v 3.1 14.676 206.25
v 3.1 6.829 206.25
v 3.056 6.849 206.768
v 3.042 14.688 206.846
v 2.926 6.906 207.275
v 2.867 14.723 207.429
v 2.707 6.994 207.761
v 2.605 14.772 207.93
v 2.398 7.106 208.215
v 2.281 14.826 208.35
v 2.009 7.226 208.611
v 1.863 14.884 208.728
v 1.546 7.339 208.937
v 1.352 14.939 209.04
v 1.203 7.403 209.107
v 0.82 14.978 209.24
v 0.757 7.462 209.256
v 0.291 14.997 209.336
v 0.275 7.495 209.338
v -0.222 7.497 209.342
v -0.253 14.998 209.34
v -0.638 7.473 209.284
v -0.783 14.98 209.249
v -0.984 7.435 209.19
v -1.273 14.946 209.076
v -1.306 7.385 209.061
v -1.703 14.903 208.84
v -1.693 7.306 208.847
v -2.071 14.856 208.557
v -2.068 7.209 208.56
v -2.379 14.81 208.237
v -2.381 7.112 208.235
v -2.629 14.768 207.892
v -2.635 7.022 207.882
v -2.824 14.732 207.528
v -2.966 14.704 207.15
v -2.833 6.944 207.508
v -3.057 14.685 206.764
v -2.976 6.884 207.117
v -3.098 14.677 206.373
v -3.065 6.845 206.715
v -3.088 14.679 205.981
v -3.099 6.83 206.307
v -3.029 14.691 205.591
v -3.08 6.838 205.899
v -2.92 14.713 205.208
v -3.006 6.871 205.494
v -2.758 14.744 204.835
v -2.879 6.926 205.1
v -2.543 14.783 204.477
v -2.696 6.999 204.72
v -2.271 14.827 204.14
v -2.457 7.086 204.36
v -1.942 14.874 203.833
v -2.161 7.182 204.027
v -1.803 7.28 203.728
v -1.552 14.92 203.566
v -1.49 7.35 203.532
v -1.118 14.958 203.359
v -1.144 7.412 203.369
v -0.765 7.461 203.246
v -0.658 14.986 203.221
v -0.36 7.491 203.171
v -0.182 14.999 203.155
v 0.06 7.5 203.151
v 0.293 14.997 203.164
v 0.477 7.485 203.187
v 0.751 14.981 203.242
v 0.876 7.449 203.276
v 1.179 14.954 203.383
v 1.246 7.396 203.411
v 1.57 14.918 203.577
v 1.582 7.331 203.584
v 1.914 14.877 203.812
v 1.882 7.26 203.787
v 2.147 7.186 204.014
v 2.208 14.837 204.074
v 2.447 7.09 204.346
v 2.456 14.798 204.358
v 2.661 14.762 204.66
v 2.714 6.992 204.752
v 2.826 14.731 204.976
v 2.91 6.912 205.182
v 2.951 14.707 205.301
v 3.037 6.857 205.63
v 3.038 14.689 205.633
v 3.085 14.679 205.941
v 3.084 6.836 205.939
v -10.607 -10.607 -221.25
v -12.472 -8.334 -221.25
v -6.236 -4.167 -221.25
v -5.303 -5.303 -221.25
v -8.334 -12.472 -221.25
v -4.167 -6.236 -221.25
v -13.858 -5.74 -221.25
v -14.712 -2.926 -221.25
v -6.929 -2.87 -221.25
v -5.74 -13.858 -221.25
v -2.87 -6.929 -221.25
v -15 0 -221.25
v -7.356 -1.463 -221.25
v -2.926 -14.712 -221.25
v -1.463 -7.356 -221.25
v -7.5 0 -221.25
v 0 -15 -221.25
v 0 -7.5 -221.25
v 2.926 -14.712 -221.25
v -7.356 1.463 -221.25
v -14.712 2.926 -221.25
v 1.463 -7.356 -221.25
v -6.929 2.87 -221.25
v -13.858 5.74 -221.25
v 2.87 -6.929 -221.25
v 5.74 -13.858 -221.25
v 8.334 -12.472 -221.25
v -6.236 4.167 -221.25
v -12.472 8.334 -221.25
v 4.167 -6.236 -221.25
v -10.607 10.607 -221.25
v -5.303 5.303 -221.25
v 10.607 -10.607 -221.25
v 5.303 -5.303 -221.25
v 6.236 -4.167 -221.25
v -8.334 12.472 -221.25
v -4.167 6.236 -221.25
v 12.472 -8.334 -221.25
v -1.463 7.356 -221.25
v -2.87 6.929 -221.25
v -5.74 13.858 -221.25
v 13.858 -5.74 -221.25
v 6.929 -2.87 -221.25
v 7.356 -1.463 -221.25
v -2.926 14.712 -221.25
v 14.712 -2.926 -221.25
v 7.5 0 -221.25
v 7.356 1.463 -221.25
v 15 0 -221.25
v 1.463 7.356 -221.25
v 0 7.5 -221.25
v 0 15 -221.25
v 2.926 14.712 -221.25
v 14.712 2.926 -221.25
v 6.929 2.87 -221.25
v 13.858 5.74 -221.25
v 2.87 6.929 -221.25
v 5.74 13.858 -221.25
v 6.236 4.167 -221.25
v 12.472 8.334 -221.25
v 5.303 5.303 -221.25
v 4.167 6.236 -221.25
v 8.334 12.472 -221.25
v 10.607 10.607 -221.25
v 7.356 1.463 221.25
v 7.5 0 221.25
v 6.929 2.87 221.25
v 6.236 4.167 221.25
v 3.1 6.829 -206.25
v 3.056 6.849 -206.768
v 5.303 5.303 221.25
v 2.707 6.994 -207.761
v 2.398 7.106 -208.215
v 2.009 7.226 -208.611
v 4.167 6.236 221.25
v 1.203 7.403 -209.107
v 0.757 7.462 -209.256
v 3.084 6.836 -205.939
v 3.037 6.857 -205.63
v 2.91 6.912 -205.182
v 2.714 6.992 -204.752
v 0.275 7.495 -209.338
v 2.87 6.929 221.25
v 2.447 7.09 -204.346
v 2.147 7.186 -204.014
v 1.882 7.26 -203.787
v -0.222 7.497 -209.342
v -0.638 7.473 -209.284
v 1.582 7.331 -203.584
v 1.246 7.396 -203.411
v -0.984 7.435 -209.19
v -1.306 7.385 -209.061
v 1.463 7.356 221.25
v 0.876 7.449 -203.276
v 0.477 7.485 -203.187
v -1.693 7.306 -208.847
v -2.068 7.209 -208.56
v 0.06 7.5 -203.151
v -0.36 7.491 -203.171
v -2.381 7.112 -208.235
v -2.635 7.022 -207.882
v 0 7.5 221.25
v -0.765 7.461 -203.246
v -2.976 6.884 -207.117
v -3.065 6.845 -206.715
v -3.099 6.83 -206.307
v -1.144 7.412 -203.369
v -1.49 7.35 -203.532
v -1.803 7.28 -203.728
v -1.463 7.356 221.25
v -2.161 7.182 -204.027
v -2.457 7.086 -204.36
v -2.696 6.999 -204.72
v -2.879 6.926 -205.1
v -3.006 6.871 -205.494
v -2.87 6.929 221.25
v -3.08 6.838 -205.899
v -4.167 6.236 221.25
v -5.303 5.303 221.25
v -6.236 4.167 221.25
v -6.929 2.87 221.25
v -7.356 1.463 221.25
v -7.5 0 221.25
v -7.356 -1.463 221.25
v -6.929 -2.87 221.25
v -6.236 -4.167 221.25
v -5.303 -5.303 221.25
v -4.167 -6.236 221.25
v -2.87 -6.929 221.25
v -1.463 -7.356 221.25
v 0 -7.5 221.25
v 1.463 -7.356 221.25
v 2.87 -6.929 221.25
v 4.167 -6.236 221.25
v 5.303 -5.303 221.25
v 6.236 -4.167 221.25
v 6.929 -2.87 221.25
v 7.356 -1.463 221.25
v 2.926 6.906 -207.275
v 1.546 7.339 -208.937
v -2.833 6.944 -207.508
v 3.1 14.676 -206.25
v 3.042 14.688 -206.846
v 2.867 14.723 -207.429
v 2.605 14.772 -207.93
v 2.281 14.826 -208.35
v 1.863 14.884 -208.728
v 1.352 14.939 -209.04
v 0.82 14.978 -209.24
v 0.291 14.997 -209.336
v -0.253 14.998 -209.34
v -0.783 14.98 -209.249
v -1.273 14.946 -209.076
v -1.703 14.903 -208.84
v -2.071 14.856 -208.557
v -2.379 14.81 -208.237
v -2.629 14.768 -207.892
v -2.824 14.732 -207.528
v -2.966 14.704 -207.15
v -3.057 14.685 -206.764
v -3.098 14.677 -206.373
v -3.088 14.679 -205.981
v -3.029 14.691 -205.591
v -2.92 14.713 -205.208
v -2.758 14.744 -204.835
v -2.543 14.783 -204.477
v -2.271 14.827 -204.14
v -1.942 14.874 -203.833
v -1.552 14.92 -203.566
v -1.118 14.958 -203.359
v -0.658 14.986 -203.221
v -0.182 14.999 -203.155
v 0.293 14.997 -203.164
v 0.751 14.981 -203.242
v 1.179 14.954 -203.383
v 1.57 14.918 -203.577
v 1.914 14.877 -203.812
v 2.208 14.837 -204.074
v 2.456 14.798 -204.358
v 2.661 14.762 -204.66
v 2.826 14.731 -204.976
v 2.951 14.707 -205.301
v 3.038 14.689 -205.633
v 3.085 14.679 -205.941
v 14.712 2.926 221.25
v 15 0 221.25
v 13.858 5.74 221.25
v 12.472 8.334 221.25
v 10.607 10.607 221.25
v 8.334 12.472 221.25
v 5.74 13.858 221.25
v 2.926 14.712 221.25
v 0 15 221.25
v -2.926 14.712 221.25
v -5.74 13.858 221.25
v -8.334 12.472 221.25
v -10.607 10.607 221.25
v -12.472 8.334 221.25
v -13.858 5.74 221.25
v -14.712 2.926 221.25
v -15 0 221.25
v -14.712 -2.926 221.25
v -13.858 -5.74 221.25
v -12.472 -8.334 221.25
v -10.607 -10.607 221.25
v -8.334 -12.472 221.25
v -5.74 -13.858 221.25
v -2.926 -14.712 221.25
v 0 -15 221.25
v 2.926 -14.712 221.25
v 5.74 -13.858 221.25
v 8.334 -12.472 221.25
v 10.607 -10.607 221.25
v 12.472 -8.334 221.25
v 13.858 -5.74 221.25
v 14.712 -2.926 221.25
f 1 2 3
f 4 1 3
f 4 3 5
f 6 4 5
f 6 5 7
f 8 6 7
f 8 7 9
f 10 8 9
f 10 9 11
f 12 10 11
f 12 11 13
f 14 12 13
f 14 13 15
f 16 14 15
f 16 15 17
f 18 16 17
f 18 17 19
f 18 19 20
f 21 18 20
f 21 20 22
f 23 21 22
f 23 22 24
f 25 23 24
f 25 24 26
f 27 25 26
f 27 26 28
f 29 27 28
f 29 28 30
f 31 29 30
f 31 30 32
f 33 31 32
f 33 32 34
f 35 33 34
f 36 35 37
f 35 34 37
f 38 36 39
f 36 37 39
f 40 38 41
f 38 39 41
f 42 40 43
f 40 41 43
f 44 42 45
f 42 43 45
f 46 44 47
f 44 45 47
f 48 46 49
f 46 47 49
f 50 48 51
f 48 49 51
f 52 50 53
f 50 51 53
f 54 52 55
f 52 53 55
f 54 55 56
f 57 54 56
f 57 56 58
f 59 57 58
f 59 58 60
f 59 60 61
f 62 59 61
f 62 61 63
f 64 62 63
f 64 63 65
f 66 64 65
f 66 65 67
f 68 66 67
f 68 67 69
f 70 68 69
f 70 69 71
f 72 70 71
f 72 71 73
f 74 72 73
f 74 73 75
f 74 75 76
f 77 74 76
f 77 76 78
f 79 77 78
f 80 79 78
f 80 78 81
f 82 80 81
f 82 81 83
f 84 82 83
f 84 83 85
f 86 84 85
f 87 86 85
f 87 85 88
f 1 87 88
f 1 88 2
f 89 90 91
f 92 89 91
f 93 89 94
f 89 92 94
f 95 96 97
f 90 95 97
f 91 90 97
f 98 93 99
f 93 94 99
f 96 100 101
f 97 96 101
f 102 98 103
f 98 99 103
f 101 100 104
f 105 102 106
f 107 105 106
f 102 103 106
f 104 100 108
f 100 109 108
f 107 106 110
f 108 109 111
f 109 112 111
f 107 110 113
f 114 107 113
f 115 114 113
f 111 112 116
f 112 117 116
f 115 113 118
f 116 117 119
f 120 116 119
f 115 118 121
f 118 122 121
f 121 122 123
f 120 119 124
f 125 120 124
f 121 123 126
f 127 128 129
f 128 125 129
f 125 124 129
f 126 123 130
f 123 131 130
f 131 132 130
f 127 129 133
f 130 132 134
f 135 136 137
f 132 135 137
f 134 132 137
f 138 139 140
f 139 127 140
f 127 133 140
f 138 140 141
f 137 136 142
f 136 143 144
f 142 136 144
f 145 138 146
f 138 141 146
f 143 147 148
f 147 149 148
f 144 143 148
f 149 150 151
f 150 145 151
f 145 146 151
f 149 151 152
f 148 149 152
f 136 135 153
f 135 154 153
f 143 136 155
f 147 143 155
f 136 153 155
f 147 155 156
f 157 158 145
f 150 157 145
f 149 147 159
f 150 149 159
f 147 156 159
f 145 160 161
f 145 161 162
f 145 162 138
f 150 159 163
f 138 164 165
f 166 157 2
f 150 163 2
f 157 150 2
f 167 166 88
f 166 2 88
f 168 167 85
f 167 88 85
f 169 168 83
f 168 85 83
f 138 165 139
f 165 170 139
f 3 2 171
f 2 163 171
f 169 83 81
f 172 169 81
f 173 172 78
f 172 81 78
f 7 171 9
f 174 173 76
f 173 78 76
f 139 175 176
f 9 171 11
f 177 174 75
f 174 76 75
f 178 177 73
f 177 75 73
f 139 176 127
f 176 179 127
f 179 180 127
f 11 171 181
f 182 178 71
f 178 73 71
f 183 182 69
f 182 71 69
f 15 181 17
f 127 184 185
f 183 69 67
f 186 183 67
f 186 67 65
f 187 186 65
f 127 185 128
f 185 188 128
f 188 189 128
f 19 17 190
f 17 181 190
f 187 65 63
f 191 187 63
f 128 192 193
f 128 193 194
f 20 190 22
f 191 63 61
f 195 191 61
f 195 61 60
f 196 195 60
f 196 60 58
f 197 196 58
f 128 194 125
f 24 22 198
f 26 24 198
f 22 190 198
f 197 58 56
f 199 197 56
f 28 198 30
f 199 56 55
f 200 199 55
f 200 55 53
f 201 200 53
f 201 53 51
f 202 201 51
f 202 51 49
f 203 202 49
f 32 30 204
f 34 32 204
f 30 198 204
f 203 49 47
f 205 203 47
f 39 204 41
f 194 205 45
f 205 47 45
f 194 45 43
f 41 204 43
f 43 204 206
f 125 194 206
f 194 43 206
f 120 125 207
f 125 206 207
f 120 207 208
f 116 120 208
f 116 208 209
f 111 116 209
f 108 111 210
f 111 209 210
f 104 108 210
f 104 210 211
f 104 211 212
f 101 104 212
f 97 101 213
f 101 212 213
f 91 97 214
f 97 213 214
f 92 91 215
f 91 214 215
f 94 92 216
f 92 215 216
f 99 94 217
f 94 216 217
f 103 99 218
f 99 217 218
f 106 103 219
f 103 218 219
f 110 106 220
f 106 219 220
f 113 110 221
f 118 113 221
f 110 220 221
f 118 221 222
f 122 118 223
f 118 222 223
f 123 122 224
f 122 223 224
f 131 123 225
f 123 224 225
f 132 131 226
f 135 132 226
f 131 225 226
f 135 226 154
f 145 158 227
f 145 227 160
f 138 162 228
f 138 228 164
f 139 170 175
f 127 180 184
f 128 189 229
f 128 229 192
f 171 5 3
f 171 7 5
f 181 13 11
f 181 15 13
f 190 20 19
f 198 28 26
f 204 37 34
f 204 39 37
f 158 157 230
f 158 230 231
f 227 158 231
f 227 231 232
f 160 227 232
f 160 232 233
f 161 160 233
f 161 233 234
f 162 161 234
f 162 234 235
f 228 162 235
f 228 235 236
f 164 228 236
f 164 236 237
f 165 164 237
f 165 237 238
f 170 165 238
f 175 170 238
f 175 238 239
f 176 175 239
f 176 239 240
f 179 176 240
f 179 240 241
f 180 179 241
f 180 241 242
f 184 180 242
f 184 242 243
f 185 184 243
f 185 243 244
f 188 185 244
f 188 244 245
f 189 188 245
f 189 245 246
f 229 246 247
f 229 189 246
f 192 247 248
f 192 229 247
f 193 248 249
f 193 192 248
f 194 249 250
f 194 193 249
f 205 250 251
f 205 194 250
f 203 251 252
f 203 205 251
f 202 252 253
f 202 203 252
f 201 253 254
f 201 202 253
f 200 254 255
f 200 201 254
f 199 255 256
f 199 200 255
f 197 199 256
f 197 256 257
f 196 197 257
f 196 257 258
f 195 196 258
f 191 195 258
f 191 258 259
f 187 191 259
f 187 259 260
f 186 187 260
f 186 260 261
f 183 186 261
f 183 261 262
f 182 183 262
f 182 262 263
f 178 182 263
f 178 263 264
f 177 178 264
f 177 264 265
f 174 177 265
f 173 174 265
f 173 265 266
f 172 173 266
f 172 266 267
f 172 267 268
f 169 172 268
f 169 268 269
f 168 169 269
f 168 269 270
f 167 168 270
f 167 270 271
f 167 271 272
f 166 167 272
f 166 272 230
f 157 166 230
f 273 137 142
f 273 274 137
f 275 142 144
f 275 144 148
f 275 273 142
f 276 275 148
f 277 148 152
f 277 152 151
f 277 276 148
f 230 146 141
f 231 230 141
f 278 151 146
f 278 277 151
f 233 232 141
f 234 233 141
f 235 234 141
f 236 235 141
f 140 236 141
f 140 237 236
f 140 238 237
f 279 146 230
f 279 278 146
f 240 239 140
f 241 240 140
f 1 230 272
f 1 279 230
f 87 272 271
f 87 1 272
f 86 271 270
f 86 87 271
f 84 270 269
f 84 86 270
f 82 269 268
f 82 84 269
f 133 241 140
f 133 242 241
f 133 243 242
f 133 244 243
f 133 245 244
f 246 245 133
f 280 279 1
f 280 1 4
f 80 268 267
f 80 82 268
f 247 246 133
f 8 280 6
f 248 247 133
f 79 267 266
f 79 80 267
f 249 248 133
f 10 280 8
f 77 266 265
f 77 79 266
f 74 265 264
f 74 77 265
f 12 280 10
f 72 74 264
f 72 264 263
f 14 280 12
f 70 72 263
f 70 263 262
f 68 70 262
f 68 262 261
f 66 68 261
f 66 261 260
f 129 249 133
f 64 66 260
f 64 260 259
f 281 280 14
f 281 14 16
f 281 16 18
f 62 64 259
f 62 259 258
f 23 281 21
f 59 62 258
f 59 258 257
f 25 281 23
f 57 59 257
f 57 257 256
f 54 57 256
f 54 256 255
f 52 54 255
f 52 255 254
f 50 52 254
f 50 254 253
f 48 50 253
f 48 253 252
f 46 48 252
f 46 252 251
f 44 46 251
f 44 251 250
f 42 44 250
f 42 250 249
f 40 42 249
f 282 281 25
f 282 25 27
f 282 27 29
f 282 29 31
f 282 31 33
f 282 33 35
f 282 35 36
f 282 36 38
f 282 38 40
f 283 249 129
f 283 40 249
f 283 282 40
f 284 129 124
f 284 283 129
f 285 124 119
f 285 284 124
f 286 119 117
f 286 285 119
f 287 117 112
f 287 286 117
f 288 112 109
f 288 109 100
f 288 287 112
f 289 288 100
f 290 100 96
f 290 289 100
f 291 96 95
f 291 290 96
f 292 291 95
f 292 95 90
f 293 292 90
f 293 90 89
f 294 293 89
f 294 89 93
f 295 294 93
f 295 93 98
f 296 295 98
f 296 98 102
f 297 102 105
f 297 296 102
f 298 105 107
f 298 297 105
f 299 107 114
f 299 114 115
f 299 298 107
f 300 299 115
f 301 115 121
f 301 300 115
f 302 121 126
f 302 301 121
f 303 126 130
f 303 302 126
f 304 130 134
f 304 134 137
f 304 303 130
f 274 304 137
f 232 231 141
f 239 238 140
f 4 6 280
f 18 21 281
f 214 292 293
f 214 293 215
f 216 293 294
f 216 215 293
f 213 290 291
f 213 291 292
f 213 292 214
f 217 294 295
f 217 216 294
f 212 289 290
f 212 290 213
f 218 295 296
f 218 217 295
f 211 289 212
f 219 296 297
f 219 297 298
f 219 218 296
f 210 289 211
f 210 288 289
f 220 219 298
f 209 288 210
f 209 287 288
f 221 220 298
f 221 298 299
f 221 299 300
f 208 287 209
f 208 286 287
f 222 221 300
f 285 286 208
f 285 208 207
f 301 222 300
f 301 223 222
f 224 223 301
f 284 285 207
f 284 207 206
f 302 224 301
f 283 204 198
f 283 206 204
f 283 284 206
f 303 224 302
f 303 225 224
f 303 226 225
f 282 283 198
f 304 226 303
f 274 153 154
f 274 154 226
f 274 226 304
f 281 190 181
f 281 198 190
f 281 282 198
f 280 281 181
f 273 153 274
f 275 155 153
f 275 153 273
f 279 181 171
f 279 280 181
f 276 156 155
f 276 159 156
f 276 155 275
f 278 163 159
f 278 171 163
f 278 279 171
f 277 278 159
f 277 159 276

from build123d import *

# Parameters (mm, degrees)
BOSS_EXTRUDE1_DEPTH      = 221.25
BOSS_EXTRUDE1_DEPTH_BACK = 221.25
SKETCH1_R                = 15
SKETCH1_R_2              = 7.5
SKETCH3_R                = 3.1
CUT_EXTRUDE1_DEPTH       = 223.264622691


with BuildPart() as part:
    # Sketch1 → Boss-Extrude1 (new, two sides: drawn at the far end of the back side and taken through both)
    with BuildSketch(Plane.XY.offset(-BOSS_EXTRUDE1_DEPTH_BACK)):
        Circle(SKETCH1_R)
        Circle(SKETCH1_R_2, mode=Mode.SUBTRACT)
    extrude(amount=BOSS_EXTRUDE1_DEPTH + BOSS_EXTRUDE1_DEPTH_BACK)

    # Sketch3 → Cut-Extrude1 (cut, through all)
    with BuildSketch(Plane(origin=(0, 0, 0), x_dir=(1, 0, 0), z_dir=(0, 1, 0))):
        with Locations((0, 206.25)):
            Circle(SKETCH3_R)
    cut_extrude1 = extrude(amount=CUT_EXTRUDE1_DEPTH, mode=Mode.SUBTRACT)

    # Mirror1: Cut-Extrude1 across plane
    add(cut_extrude1.mirror(Plane.XY), mode=Mode.SUBTRACT)


solid = part.part
